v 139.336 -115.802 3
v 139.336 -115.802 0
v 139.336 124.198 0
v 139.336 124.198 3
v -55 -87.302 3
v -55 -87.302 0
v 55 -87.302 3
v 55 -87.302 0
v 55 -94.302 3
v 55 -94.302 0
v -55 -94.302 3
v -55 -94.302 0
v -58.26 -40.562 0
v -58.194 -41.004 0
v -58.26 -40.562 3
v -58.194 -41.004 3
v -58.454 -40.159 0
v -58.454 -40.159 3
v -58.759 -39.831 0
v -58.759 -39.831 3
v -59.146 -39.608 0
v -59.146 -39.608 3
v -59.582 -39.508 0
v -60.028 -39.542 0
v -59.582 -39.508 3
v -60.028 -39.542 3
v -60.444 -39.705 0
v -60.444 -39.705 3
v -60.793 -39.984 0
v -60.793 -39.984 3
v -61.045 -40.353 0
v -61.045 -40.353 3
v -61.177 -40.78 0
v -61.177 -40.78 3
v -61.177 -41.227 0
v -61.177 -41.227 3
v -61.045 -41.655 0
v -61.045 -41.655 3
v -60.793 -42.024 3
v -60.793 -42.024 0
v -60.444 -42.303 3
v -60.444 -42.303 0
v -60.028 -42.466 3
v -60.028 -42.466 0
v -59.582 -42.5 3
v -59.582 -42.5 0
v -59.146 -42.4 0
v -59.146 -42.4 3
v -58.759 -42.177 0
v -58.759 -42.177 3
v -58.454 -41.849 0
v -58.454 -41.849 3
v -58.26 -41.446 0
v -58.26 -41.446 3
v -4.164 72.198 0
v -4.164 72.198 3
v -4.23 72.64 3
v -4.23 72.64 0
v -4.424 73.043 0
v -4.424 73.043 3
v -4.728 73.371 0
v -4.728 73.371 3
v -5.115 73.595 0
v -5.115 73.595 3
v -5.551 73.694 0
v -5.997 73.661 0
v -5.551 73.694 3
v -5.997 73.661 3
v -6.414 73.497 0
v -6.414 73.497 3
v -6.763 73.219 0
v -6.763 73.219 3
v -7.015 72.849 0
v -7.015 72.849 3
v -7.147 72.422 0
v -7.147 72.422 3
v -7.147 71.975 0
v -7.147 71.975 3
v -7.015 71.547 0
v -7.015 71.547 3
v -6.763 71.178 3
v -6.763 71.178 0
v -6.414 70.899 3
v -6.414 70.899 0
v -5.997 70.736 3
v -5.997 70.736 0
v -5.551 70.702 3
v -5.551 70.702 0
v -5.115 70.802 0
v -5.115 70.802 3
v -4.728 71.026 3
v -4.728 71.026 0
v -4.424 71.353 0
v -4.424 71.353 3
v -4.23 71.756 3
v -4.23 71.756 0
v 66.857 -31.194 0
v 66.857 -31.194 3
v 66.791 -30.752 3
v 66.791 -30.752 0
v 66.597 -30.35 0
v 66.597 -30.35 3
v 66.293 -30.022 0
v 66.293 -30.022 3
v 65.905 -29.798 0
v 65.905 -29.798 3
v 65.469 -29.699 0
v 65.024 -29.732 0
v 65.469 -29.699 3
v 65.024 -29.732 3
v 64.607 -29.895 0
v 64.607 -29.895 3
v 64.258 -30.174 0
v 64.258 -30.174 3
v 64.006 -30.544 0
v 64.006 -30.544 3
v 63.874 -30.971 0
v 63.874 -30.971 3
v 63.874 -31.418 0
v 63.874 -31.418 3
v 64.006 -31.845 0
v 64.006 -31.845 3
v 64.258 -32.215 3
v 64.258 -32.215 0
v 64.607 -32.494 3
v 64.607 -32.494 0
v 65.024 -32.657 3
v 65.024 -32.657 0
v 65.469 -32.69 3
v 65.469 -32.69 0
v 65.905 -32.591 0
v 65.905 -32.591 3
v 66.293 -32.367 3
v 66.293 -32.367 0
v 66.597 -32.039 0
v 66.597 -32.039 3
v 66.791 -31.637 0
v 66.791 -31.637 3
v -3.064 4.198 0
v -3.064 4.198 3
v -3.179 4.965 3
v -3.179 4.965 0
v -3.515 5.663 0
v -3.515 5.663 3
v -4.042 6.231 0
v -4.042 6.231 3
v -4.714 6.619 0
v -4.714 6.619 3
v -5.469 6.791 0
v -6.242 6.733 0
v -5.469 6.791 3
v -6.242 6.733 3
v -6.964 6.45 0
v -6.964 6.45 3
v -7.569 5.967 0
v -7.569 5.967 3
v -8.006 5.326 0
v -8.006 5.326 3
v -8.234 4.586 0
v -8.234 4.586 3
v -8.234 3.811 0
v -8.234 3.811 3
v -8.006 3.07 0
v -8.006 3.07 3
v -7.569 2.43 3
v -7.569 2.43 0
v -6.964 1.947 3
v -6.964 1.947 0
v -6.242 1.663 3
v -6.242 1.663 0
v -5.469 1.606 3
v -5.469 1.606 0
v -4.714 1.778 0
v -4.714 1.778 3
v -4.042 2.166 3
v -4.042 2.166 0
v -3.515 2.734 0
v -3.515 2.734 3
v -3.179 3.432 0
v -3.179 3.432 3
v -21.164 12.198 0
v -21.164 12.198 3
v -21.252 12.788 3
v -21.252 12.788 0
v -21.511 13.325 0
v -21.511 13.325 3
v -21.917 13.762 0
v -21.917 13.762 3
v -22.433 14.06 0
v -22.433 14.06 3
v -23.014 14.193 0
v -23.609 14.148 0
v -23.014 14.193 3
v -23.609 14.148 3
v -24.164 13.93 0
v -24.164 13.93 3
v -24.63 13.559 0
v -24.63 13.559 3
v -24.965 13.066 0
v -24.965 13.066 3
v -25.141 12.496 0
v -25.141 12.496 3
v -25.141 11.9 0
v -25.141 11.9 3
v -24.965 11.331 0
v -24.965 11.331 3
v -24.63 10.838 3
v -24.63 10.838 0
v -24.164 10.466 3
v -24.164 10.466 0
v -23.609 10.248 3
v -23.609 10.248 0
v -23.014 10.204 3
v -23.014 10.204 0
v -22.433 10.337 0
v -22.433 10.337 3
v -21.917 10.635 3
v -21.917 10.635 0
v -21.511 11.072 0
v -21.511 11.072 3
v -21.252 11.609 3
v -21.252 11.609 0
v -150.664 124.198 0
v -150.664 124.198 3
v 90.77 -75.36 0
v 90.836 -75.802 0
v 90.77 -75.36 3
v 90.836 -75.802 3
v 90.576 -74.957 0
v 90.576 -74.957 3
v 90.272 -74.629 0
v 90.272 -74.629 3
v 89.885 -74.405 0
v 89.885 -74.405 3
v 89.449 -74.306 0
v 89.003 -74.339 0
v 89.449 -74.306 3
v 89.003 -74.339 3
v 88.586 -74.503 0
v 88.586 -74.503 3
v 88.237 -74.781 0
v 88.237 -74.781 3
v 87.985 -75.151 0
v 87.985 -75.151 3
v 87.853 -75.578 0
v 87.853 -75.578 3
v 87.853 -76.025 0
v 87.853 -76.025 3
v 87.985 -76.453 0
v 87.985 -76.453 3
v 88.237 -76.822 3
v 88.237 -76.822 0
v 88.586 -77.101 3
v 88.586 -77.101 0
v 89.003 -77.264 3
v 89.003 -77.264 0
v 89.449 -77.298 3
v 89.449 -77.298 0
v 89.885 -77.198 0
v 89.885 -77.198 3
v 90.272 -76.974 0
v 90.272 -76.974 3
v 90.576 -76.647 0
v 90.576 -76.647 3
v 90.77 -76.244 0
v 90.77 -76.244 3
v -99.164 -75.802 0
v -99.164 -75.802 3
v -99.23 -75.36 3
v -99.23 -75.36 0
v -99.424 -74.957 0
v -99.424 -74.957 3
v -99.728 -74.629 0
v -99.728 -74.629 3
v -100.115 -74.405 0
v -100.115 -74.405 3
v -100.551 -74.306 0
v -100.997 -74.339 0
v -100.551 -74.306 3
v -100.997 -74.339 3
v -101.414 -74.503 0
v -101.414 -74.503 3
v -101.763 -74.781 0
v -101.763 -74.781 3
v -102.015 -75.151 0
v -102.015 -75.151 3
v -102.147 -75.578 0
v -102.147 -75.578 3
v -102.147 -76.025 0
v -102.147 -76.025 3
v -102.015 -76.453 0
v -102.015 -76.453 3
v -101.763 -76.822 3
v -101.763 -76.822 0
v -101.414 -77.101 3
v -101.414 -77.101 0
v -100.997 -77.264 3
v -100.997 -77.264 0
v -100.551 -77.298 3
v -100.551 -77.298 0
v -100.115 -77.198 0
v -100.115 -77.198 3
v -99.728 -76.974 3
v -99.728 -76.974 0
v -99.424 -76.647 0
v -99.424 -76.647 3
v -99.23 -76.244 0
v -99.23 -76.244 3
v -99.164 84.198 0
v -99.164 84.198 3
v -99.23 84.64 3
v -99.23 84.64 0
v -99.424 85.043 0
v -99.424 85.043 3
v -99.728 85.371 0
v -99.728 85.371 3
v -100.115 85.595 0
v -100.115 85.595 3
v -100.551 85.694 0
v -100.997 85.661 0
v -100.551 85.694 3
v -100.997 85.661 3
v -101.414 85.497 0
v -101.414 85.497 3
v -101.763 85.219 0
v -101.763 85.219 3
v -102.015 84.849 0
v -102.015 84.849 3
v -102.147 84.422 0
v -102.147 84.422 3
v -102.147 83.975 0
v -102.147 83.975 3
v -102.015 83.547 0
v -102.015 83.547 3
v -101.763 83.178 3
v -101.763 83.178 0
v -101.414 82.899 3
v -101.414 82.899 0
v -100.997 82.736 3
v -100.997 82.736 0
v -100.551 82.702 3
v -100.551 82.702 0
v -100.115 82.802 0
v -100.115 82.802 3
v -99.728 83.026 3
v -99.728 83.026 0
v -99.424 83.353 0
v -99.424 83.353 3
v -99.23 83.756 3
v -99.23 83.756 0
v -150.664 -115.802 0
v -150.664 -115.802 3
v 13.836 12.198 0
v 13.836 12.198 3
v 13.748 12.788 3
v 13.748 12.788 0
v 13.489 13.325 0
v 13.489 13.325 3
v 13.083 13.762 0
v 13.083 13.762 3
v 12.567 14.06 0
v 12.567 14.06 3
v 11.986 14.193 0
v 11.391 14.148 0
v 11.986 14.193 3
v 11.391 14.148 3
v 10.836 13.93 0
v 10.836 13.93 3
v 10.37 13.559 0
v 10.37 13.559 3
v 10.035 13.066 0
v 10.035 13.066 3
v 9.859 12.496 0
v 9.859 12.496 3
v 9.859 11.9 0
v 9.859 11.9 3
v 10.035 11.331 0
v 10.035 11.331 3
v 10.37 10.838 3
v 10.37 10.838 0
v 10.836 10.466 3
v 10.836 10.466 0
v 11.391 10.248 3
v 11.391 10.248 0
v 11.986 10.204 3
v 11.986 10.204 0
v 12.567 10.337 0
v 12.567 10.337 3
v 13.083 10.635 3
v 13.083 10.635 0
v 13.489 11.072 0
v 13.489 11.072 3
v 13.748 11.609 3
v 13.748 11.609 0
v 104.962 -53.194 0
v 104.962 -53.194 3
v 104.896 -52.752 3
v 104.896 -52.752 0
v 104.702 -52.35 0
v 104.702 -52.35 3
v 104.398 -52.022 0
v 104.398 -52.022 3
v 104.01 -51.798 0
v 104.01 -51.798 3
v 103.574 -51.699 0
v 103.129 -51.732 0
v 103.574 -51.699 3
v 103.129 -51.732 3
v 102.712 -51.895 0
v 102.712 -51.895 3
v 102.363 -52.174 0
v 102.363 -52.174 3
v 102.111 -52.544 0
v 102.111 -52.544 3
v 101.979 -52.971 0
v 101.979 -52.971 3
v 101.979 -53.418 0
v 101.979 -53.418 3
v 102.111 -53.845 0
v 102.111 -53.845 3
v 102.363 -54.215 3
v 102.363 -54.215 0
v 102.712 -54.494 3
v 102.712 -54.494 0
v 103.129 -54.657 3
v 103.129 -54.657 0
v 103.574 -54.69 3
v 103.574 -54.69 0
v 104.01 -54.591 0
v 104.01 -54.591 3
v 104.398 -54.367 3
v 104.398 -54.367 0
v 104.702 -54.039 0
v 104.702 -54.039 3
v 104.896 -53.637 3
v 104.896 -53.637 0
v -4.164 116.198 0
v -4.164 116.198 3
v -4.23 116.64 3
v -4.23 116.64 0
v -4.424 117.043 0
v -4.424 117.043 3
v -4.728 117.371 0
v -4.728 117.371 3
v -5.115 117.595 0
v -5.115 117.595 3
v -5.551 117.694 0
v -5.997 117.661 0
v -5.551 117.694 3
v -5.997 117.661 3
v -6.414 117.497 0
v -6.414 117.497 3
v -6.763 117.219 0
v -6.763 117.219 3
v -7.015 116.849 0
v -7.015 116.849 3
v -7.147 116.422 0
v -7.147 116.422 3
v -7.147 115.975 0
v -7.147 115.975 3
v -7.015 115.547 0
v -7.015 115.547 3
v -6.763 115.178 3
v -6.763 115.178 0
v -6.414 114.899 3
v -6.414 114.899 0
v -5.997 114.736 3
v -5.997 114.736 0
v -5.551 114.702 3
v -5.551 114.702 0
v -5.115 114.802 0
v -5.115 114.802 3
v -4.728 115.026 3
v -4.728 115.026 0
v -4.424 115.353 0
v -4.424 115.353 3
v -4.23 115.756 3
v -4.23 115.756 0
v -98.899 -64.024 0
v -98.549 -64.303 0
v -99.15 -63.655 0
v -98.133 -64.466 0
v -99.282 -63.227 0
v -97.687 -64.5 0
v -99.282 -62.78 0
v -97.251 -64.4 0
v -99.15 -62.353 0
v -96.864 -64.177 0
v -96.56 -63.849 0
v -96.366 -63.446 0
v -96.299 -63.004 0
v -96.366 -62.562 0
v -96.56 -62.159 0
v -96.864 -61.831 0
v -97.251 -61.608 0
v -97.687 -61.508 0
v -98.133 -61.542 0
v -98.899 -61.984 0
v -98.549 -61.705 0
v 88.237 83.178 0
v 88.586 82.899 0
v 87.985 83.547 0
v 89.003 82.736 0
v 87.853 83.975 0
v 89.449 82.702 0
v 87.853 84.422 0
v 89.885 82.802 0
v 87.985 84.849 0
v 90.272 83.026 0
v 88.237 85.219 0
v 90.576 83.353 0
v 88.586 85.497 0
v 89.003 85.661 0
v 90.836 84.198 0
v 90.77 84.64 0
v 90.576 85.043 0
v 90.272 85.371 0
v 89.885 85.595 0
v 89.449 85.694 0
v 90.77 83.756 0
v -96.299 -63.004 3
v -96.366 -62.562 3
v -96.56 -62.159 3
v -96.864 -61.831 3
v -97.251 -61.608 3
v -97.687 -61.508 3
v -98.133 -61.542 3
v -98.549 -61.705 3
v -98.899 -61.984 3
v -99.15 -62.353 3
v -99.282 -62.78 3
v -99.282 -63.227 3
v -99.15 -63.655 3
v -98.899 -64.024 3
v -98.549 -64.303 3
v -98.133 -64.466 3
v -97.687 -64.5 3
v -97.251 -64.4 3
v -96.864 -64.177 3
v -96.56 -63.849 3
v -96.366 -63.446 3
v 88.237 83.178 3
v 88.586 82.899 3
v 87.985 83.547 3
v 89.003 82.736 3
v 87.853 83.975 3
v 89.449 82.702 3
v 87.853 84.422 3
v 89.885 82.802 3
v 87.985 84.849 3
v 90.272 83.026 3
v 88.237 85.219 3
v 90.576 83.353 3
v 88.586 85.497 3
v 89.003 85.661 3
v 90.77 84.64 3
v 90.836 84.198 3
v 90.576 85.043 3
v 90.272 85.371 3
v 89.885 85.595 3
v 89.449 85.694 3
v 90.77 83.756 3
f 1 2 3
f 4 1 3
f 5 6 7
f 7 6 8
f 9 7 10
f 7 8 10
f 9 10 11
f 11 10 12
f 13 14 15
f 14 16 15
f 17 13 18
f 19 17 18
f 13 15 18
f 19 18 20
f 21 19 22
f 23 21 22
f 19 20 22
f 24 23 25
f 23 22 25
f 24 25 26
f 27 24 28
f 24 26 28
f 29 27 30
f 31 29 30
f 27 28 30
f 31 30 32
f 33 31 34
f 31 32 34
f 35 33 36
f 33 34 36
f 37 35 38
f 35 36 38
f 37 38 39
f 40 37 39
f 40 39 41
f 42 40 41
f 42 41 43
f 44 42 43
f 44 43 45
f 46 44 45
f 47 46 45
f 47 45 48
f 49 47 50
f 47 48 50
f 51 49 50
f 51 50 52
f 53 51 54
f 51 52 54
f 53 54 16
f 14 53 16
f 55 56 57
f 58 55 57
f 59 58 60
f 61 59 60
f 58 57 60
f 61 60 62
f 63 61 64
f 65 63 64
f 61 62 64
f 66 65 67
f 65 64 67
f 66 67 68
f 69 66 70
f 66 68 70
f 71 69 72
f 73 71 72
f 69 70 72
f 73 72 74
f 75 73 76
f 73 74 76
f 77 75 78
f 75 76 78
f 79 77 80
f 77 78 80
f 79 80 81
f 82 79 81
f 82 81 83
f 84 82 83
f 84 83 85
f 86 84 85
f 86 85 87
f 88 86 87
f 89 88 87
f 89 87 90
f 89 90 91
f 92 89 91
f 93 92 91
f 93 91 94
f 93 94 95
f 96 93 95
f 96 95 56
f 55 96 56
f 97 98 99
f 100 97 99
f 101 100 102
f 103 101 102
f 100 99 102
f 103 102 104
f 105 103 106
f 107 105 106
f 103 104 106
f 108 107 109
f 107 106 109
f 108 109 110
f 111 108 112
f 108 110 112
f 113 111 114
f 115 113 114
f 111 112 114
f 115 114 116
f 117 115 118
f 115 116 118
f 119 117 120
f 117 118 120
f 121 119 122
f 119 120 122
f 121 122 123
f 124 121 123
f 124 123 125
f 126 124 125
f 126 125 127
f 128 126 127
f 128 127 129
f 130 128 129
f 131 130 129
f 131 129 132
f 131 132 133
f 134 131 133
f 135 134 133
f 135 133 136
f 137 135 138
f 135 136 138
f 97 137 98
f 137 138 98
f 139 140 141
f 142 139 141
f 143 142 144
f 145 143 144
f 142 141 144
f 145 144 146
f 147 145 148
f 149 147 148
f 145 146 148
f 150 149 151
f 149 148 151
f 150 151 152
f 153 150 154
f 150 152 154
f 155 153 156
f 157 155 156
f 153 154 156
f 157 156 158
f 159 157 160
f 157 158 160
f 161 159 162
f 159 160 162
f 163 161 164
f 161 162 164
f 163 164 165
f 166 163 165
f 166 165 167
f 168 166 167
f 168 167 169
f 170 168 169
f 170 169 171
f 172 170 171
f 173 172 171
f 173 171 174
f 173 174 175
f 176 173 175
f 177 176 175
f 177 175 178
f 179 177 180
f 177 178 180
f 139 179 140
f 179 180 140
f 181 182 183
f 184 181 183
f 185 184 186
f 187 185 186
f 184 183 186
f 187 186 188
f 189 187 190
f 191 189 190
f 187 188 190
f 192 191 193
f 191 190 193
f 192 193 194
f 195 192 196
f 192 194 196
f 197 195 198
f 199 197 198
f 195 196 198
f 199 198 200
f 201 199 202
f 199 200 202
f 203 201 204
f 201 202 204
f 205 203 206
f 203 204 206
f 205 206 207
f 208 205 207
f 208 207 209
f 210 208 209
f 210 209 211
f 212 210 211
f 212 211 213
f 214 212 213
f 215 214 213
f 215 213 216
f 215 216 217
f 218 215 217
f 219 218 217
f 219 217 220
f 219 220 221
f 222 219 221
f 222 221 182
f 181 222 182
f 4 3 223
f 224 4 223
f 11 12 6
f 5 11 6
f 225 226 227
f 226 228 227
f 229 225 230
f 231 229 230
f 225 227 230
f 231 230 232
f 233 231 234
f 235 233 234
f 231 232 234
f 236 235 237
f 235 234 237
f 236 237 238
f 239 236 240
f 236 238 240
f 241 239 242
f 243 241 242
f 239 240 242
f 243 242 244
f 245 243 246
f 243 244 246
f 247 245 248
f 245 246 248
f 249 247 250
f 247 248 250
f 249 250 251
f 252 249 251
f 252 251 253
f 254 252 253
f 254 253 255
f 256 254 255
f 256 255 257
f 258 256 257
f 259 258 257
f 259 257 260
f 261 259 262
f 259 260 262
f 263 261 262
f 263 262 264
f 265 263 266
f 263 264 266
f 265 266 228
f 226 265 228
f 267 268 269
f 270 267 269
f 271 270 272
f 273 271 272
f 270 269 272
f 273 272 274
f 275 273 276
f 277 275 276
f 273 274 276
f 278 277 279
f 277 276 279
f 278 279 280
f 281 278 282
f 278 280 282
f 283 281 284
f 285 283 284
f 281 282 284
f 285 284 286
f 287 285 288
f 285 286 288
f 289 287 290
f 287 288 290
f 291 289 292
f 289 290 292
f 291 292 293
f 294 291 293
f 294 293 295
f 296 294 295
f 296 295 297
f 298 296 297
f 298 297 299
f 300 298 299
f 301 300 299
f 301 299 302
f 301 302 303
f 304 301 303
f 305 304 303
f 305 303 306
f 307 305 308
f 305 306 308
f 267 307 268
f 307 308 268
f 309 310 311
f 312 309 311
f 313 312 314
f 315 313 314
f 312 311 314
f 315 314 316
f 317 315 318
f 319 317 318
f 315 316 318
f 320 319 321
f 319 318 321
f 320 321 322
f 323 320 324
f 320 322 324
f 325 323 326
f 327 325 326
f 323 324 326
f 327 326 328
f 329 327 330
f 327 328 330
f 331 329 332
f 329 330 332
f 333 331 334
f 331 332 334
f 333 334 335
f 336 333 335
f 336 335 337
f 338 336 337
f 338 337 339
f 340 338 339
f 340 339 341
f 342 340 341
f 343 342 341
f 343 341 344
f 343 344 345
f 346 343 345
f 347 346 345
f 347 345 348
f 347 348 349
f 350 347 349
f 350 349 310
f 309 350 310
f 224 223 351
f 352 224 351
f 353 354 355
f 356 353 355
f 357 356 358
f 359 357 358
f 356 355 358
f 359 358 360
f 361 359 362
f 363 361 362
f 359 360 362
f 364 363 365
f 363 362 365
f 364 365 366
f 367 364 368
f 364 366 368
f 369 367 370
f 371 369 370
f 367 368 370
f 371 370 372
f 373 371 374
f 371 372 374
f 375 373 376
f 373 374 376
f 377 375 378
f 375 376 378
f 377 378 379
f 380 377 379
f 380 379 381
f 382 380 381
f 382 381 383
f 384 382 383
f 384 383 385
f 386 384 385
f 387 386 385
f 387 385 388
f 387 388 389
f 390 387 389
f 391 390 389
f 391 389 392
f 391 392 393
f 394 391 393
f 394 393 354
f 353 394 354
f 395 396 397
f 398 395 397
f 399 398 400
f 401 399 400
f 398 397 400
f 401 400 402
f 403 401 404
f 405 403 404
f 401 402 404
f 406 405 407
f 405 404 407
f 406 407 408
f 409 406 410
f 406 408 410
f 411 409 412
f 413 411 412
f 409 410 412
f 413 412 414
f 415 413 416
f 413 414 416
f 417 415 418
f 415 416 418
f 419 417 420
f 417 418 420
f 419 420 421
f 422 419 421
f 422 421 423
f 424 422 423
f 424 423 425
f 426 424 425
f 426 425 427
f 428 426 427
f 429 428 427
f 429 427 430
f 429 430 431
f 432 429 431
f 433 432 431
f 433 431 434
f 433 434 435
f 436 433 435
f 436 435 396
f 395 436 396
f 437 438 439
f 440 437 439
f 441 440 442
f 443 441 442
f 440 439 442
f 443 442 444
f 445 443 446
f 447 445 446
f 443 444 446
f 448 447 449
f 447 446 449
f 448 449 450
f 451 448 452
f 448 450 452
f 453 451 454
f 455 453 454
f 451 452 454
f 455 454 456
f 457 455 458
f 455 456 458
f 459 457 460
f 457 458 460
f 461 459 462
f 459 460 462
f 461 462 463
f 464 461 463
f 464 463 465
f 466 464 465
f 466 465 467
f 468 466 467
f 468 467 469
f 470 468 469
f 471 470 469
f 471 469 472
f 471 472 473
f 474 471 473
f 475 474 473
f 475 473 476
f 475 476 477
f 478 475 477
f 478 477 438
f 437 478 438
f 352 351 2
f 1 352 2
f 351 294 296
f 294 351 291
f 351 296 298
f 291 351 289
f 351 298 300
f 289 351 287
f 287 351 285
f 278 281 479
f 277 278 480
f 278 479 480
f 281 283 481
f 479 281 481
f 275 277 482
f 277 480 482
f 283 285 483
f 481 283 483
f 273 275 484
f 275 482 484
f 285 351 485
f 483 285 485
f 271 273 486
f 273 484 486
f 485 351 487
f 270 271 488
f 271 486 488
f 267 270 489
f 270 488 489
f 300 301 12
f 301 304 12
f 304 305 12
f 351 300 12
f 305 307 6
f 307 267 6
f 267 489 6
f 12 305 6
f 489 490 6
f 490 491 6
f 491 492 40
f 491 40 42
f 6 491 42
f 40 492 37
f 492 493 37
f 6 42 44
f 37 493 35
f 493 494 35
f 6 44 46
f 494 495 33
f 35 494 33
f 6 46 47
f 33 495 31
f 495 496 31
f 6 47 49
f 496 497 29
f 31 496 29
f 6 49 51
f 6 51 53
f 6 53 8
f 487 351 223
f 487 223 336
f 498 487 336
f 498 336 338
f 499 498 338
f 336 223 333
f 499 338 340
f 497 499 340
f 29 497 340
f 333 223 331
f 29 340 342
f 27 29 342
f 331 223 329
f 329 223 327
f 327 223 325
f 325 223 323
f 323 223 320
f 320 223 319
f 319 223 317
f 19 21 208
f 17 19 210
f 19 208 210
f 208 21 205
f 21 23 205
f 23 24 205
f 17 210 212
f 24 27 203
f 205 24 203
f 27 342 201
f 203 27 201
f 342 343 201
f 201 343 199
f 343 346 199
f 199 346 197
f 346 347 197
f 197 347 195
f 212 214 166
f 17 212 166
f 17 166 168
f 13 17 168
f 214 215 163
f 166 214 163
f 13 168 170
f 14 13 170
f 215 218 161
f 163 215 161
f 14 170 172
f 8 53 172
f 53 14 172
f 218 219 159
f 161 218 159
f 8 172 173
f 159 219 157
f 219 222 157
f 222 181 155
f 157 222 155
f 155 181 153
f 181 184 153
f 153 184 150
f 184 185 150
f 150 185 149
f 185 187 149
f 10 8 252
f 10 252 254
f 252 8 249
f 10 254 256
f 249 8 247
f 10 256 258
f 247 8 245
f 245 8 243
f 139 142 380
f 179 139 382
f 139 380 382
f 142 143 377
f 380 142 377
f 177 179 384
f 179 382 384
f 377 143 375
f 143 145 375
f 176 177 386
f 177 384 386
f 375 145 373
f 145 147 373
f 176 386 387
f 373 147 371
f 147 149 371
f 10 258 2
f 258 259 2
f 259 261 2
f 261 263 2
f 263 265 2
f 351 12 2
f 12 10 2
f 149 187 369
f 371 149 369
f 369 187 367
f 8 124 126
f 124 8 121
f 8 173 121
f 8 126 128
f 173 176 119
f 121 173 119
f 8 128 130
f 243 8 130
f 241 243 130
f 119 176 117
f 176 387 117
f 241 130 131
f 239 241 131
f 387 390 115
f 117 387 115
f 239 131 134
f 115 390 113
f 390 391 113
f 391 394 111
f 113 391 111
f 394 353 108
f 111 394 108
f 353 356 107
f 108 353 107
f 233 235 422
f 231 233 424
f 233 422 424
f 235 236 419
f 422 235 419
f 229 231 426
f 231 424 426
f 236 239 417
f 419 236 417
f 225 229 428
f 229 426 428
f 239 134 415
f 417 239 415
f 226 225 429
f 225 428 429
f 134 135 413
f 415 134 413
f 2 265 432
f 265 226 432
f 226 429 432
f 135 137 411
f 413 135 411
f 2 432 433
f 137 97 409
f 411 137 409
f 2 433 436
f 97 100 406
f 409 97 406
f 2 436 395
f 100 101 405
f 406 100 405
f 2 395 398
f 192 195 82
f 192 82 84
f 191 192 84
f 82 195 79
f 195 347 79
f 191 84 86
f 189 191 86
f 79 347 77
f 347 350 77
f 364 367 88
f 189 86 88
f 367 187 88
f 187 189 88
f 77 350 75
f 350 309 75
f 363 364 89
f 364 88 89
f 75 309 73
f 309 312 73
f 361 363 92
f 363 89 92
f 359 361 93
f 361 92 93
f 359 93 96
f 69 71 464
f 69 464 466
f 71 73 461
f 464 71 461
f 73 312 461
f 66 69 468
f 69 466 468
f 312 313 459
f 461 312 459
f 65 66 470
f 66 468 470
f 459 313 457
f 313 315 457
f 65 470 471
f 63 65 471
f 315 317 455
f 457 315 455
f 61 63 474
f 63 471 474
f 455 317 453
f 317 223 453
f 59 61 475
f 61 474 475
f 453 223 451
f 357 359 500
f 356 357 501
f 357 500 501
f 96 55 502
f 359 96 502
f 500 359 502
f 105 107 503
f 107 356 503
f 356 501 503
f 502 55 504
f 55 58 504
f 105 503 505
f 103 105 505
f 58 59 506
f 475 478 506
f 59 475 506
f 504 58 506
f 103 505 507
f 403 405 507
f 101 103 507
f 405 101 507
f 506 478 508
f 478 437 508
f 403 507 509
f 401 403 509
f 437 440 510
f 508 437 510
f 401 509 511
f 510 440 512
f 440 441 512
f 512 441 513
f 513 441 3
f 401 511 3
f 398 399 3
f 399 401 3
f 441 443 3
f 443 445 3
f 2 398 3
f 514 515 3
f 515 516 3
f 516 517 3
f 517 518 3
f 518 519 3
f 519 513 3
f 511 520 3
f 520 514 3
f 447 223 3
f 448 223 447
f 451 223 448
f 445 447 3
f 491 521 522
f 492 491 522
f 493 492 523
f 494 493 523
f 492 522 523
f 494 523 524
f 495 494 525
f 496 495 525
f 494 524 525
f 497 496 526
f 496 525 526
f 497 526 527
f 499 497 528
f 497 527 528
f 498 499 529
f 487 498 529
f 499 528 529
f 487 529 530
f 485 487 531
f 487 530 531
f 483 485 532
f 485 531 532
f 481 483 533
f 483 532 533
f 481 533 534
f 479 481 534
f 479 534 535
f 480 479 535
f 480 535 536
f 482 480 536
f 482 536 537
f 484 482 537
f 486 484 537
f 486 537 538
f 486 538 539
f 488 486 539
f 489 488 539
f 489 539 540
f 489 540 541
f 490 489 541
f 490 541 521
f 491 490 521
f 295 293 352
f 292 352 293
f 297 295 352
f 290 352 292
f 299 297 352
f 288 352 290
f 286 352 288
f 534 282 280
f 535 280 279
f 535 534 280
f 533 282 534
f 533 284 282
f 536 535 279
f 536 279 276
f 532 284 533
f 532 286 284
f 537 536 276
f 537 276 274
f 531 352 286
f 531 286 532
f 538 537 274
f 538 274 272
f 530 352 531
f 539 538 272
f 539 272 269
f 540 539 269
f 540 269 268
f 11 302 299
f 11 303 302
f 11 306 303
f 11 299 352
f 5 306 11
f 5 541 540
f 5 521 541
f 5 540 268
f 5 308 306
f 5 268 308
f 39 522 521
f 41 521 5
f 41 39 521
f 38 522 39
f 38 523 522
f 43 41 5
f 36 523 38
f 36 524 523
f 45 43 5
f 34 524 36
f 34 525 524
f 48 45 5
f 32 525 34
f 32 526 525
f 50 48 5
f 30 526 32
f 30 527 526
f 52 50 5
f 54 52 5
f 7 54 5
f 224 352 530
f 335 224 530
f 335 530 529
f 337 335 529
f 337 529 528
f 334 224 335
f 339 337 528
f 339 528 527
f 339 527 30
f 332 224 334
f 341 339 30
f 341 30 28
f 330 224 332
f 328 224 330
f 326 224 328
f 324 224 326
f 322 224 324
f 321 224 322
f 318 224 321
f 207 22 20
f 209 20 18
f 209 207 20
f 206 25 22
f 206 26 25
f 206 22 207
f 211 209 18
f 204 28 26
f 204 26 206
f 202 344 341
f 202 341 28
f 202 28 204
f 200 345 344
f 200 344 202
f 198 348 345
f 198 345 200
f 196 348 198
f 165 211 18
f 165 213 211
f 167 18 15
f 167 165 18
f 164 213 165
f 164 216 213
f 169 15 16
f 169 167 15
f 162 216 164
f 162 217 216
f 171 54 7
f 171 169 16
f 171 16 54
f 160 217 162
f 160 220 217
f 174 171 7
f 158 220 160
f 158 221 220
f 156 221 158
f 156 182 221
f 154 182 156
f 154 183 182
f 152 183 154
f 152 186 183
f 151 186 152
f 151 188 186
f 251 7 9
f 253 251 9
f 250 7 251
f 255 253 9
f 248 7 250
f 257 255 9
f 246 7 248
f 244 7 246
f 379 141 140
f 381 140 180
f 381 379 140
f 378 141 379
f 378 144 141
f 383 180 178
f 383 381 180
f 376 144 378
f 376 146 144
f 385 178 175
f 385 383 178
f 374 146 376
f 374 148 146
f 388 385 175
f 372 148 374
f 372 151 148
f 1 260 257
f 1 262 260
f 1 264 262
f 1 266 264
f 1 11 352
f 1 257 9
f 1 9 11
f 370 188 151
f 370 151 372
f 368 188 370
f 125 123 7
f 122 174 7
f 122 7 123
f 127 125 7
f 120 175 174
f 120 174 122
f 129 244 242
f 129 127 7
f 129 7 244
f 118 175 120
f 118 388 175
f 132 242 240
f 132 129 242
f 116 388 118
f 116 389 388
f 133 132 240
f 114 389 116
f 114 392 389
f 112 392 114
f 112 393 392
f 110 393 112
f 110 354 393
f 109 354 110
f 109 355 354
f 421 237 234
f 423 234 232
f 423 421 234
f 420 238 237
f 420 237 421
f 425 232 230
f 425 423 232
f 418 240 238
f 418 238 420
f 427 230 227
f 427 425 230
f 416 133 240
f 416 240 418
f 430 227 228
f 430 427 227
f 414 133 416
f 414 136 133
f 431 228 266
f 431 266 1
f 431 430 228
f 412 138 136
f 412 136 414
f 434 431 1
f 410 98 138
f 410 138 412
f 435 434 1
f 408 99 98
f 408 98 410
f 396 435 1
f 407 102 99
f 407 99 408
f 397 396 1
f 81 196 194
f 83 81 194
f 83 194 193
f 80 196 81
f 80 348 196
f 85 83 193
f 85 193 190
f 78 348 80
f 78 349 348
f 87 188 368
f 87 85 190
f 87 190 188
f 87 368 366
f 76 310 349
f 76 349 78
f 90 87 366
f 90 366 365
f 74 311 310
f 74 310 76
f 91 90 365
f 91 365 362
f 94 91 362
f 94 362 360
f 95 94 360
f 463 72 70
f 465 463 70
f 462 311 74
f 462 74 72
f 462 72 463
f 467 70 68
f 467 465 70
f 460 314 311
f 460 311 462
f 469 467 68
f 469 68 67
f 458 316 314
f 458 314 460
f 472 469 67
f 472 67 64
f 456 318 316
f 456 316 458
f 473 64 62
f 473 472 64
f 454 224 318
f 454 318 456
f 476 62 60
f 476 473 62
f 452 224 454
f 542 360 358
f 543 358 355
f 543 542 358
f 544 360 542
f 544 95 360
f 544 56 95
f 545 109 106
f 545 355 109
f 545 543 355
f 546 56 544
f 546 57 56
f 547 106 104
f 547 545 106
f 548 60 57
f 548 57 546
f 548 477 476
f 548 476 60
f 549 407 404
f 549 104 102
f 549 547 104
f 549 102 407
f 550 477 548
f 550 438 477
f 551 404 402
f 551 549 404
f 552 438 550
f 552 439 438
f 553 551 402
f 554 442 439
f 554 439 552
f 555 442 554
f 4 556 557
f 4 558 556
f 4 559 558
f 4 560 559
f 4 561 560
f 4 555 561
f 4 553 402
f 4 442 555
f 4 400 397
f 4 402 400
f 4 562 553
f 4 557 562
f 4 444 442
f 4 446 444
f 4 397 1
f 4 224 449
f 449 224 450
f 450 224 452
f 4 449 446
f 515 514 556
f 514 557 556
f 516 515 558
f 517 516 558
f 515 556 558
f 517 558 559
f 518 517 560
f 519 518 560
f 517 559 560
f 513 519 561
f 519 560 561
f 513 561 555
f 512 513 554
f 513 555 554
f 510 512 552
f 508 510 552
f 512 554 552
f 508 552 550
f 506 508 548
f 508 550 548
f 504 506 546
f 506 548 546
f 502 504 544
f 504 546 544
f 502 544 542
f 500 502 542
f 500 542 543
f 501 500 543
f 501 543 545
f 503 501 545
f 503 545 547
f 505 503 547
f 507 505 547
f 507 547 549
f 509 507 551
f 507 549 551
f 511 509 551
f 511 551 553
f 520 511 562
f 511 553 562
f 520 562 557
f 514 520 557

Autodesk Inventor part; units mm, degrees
ref_plane "YZ Plane" through (0, 0, 0) normal (1, 0, 0) x (0, 1, 0)
ref_plane "XZ Plane" through (0, 0, 0) normal (0, 1, 0) x (-1, 0, 0)
ref_plane "XY Plane" through (0, 0, 0) normal (0, 0, 1) x (1, 0, 0)
sketch "Эскиз1" plane through (0, 0, 0) normal (0, 0, 1) x (1, 0, 0)
  line L0 (-150.6635, -115.8017) -> (139.3365, -115.8017)
  line L1 (139.3365, -115.8017) -> (139.3365, 124.1983)
  line L2 (139.3365, 124.1983) -> (-150.6635, 124.1983)
  line L3 (-150.6635, 124.1983) -> (-150.6635, -115.8017)
  line L4 (139.3365, -115.8017) -> (-150.6635, 124.1983) construction
  line L5 (-150.6635, -115.8017) -> (139.3365, 124.1983) construction
  point P0 (-5.6635, 4.1983)
  point P1 (-5.6635, 4.1983)
  point P2 (-5.6635, 4.1983)
  dimension "d0" = 240
  dimension "d1" = 290
extrude "Выдавливание1" add sketch "Эскиз1" along normal blind 3
sketch "Эскиз2" plane through (0, 0, 3) normal (0, 0, 1) x (1, 0, 0)
  circle A0 centre (0, 0) radius 100
  dimension "d4" = 200
ref_plane "РабПлоскость1" through (-5.6635, -115.8017, 0) normal (-1, 0, 0) x (0, 0, 1)
ref_plane "РабПлоскость2" through (-150.6635, 4.1983, 0) normal (0, 1, 0) x (1, 0, 0)
sketch "Эскиз3" plane through (0, 0, 3) normal (0, 0, 1) x (1, 0, 0)
  circle A0 centre (-97.799, -63.0039) radius 1.5 projected
  circle A1 centre (-59.6938, -41.0039) radius 1.5 projected
  circle A2 centre (103.4624, -53.1945) radius 1.5 projected
  circle A3 centre (65.3573, -31.1945) radius 1.5 projected
  circle A4 centre (-5.6635, 72.1983) radius 1.5 projected
  circle A5 centre (-5.6635, 116.1983) radius 1.5 projected
  point P0 (0, 0)
extrude "Выдавливание2" cut sketch "Эскиз3" against normal blind 10
sketch "Эскиз4" plane through (0, 0, 0) normal (0, 0, -1) x (-1, 0, 0)
  line L0 (-55, -94.3017) -> (55, -94.3017)
  line L1 (55, -94.3017) -> (55, -87.3017)
  line L2 (55, -87.3017) -> (-55, -87.3017)
  line L3 (-55, -87.3017) -> (-55, -94.3017)
  line L4 (0, 0) -> (0, 37.9821) construction
  line L5 (150.6635, -115.8017) -> (-139.3365, -115.8017) construction
  line L6 (-11.6132, -94.8017) -> (-38.9526, -94.8017) projected
  line L7 (-11.6132, -89.8017) -> (-38.9526, -89.8017) projected
  point P0 (0, -87.3017)
  dimension "d7" = 7
  dimension "d8" = 55
  dimension "d9" = 21.5
extrude "Выдавливание3" cut sketch "Эскиз4" against normal blind 10
sketch "Эскиз6" plane through (0, 0, 3) normal (0, 0, 1) x (1, 0, 0)
  circle A0 centre (-23.1635, 12.1983) radius 2 projected
  circle A1 centre (11.8365, 12.1983) radius 2 projected
  line L0 (55, -87.3017) -> (-55, -87.3017) projected
  line L1 (-55, -87.3017) -> (-55, -94.3017) projected
  line L2 (-55, -94.3017) -> (55, -94.3017) projected
  line L3 (55, -94.3017) -> (55, -87.3017) projected
  circle A2 centre (65.3573, -31.1945) radius 1.5 projected
  circle A3 centre (-97.799, -63.0039) radius 1.5 projected
  circle A4 centre (103.4624, -53.1945) radius 1.5 projected
  circle A5 centre (-59.6938, -41.0039) radius 1.5 projected
  circle A6 centre (-5.6635, 72.1983) radius 1.5 projected
  circle A7 centre (-5.6635, 116.1983) radius 1.5 projected
  line L4 (139.3365, -115.8017) -> (139.3365, 124.1983) projected
  line L5 (-150.6635, -115.8017) -> (139.3365, -115.8017) projected
  line L6 (-150.6635, 124.1983) -> (-150.6635, -115.8017) projected
  line L7 (139.3365, 124.1983) -> (-150.6635, 124.1983) projected
  arc A8 (-7.1635, 6.1983) -> (-7.1635, 2.1983) centre (-5.6635, 4.1983) ccw projected
  circle A9 centre (-5.6635, 4.1983) radius 2.6
  point P0 (0, 0)
  point P1 (0.9551, 9.8906)
  dimension "d16" = 0.1
extrude "Выдавливание5" cut sketch "Эскиз6" against normal blind 10 contours A0 | A1 | A9
sketch "Эскиз7" plane through (0, 0, 3) normal (0, 0, 1) x (1, 0, 0)
  circle A0 centre (89.3365, -75.8017) radius 1.5 projected
  circle A1 centre (89.3365, 84.1983) radius 1.5 projected
  circle A2 centre (-100.6635, 84.1983) radius 1.5 projected
  line L0 (-150.6635, -115.8017) -> (139.3365, -115.8017) projected
  line L1 (-150.6635, 124.1983) -> (-150.6635, -115.8017) projected
  circle A3 centre (-100.6635, -75.8017) radius 1.5 projected
  point P0 (0, 0)
extrude "Выдавливание6" cut sketch "Эскиз7" against normal blind 10
properties part number "панель_электроники_и не только"
